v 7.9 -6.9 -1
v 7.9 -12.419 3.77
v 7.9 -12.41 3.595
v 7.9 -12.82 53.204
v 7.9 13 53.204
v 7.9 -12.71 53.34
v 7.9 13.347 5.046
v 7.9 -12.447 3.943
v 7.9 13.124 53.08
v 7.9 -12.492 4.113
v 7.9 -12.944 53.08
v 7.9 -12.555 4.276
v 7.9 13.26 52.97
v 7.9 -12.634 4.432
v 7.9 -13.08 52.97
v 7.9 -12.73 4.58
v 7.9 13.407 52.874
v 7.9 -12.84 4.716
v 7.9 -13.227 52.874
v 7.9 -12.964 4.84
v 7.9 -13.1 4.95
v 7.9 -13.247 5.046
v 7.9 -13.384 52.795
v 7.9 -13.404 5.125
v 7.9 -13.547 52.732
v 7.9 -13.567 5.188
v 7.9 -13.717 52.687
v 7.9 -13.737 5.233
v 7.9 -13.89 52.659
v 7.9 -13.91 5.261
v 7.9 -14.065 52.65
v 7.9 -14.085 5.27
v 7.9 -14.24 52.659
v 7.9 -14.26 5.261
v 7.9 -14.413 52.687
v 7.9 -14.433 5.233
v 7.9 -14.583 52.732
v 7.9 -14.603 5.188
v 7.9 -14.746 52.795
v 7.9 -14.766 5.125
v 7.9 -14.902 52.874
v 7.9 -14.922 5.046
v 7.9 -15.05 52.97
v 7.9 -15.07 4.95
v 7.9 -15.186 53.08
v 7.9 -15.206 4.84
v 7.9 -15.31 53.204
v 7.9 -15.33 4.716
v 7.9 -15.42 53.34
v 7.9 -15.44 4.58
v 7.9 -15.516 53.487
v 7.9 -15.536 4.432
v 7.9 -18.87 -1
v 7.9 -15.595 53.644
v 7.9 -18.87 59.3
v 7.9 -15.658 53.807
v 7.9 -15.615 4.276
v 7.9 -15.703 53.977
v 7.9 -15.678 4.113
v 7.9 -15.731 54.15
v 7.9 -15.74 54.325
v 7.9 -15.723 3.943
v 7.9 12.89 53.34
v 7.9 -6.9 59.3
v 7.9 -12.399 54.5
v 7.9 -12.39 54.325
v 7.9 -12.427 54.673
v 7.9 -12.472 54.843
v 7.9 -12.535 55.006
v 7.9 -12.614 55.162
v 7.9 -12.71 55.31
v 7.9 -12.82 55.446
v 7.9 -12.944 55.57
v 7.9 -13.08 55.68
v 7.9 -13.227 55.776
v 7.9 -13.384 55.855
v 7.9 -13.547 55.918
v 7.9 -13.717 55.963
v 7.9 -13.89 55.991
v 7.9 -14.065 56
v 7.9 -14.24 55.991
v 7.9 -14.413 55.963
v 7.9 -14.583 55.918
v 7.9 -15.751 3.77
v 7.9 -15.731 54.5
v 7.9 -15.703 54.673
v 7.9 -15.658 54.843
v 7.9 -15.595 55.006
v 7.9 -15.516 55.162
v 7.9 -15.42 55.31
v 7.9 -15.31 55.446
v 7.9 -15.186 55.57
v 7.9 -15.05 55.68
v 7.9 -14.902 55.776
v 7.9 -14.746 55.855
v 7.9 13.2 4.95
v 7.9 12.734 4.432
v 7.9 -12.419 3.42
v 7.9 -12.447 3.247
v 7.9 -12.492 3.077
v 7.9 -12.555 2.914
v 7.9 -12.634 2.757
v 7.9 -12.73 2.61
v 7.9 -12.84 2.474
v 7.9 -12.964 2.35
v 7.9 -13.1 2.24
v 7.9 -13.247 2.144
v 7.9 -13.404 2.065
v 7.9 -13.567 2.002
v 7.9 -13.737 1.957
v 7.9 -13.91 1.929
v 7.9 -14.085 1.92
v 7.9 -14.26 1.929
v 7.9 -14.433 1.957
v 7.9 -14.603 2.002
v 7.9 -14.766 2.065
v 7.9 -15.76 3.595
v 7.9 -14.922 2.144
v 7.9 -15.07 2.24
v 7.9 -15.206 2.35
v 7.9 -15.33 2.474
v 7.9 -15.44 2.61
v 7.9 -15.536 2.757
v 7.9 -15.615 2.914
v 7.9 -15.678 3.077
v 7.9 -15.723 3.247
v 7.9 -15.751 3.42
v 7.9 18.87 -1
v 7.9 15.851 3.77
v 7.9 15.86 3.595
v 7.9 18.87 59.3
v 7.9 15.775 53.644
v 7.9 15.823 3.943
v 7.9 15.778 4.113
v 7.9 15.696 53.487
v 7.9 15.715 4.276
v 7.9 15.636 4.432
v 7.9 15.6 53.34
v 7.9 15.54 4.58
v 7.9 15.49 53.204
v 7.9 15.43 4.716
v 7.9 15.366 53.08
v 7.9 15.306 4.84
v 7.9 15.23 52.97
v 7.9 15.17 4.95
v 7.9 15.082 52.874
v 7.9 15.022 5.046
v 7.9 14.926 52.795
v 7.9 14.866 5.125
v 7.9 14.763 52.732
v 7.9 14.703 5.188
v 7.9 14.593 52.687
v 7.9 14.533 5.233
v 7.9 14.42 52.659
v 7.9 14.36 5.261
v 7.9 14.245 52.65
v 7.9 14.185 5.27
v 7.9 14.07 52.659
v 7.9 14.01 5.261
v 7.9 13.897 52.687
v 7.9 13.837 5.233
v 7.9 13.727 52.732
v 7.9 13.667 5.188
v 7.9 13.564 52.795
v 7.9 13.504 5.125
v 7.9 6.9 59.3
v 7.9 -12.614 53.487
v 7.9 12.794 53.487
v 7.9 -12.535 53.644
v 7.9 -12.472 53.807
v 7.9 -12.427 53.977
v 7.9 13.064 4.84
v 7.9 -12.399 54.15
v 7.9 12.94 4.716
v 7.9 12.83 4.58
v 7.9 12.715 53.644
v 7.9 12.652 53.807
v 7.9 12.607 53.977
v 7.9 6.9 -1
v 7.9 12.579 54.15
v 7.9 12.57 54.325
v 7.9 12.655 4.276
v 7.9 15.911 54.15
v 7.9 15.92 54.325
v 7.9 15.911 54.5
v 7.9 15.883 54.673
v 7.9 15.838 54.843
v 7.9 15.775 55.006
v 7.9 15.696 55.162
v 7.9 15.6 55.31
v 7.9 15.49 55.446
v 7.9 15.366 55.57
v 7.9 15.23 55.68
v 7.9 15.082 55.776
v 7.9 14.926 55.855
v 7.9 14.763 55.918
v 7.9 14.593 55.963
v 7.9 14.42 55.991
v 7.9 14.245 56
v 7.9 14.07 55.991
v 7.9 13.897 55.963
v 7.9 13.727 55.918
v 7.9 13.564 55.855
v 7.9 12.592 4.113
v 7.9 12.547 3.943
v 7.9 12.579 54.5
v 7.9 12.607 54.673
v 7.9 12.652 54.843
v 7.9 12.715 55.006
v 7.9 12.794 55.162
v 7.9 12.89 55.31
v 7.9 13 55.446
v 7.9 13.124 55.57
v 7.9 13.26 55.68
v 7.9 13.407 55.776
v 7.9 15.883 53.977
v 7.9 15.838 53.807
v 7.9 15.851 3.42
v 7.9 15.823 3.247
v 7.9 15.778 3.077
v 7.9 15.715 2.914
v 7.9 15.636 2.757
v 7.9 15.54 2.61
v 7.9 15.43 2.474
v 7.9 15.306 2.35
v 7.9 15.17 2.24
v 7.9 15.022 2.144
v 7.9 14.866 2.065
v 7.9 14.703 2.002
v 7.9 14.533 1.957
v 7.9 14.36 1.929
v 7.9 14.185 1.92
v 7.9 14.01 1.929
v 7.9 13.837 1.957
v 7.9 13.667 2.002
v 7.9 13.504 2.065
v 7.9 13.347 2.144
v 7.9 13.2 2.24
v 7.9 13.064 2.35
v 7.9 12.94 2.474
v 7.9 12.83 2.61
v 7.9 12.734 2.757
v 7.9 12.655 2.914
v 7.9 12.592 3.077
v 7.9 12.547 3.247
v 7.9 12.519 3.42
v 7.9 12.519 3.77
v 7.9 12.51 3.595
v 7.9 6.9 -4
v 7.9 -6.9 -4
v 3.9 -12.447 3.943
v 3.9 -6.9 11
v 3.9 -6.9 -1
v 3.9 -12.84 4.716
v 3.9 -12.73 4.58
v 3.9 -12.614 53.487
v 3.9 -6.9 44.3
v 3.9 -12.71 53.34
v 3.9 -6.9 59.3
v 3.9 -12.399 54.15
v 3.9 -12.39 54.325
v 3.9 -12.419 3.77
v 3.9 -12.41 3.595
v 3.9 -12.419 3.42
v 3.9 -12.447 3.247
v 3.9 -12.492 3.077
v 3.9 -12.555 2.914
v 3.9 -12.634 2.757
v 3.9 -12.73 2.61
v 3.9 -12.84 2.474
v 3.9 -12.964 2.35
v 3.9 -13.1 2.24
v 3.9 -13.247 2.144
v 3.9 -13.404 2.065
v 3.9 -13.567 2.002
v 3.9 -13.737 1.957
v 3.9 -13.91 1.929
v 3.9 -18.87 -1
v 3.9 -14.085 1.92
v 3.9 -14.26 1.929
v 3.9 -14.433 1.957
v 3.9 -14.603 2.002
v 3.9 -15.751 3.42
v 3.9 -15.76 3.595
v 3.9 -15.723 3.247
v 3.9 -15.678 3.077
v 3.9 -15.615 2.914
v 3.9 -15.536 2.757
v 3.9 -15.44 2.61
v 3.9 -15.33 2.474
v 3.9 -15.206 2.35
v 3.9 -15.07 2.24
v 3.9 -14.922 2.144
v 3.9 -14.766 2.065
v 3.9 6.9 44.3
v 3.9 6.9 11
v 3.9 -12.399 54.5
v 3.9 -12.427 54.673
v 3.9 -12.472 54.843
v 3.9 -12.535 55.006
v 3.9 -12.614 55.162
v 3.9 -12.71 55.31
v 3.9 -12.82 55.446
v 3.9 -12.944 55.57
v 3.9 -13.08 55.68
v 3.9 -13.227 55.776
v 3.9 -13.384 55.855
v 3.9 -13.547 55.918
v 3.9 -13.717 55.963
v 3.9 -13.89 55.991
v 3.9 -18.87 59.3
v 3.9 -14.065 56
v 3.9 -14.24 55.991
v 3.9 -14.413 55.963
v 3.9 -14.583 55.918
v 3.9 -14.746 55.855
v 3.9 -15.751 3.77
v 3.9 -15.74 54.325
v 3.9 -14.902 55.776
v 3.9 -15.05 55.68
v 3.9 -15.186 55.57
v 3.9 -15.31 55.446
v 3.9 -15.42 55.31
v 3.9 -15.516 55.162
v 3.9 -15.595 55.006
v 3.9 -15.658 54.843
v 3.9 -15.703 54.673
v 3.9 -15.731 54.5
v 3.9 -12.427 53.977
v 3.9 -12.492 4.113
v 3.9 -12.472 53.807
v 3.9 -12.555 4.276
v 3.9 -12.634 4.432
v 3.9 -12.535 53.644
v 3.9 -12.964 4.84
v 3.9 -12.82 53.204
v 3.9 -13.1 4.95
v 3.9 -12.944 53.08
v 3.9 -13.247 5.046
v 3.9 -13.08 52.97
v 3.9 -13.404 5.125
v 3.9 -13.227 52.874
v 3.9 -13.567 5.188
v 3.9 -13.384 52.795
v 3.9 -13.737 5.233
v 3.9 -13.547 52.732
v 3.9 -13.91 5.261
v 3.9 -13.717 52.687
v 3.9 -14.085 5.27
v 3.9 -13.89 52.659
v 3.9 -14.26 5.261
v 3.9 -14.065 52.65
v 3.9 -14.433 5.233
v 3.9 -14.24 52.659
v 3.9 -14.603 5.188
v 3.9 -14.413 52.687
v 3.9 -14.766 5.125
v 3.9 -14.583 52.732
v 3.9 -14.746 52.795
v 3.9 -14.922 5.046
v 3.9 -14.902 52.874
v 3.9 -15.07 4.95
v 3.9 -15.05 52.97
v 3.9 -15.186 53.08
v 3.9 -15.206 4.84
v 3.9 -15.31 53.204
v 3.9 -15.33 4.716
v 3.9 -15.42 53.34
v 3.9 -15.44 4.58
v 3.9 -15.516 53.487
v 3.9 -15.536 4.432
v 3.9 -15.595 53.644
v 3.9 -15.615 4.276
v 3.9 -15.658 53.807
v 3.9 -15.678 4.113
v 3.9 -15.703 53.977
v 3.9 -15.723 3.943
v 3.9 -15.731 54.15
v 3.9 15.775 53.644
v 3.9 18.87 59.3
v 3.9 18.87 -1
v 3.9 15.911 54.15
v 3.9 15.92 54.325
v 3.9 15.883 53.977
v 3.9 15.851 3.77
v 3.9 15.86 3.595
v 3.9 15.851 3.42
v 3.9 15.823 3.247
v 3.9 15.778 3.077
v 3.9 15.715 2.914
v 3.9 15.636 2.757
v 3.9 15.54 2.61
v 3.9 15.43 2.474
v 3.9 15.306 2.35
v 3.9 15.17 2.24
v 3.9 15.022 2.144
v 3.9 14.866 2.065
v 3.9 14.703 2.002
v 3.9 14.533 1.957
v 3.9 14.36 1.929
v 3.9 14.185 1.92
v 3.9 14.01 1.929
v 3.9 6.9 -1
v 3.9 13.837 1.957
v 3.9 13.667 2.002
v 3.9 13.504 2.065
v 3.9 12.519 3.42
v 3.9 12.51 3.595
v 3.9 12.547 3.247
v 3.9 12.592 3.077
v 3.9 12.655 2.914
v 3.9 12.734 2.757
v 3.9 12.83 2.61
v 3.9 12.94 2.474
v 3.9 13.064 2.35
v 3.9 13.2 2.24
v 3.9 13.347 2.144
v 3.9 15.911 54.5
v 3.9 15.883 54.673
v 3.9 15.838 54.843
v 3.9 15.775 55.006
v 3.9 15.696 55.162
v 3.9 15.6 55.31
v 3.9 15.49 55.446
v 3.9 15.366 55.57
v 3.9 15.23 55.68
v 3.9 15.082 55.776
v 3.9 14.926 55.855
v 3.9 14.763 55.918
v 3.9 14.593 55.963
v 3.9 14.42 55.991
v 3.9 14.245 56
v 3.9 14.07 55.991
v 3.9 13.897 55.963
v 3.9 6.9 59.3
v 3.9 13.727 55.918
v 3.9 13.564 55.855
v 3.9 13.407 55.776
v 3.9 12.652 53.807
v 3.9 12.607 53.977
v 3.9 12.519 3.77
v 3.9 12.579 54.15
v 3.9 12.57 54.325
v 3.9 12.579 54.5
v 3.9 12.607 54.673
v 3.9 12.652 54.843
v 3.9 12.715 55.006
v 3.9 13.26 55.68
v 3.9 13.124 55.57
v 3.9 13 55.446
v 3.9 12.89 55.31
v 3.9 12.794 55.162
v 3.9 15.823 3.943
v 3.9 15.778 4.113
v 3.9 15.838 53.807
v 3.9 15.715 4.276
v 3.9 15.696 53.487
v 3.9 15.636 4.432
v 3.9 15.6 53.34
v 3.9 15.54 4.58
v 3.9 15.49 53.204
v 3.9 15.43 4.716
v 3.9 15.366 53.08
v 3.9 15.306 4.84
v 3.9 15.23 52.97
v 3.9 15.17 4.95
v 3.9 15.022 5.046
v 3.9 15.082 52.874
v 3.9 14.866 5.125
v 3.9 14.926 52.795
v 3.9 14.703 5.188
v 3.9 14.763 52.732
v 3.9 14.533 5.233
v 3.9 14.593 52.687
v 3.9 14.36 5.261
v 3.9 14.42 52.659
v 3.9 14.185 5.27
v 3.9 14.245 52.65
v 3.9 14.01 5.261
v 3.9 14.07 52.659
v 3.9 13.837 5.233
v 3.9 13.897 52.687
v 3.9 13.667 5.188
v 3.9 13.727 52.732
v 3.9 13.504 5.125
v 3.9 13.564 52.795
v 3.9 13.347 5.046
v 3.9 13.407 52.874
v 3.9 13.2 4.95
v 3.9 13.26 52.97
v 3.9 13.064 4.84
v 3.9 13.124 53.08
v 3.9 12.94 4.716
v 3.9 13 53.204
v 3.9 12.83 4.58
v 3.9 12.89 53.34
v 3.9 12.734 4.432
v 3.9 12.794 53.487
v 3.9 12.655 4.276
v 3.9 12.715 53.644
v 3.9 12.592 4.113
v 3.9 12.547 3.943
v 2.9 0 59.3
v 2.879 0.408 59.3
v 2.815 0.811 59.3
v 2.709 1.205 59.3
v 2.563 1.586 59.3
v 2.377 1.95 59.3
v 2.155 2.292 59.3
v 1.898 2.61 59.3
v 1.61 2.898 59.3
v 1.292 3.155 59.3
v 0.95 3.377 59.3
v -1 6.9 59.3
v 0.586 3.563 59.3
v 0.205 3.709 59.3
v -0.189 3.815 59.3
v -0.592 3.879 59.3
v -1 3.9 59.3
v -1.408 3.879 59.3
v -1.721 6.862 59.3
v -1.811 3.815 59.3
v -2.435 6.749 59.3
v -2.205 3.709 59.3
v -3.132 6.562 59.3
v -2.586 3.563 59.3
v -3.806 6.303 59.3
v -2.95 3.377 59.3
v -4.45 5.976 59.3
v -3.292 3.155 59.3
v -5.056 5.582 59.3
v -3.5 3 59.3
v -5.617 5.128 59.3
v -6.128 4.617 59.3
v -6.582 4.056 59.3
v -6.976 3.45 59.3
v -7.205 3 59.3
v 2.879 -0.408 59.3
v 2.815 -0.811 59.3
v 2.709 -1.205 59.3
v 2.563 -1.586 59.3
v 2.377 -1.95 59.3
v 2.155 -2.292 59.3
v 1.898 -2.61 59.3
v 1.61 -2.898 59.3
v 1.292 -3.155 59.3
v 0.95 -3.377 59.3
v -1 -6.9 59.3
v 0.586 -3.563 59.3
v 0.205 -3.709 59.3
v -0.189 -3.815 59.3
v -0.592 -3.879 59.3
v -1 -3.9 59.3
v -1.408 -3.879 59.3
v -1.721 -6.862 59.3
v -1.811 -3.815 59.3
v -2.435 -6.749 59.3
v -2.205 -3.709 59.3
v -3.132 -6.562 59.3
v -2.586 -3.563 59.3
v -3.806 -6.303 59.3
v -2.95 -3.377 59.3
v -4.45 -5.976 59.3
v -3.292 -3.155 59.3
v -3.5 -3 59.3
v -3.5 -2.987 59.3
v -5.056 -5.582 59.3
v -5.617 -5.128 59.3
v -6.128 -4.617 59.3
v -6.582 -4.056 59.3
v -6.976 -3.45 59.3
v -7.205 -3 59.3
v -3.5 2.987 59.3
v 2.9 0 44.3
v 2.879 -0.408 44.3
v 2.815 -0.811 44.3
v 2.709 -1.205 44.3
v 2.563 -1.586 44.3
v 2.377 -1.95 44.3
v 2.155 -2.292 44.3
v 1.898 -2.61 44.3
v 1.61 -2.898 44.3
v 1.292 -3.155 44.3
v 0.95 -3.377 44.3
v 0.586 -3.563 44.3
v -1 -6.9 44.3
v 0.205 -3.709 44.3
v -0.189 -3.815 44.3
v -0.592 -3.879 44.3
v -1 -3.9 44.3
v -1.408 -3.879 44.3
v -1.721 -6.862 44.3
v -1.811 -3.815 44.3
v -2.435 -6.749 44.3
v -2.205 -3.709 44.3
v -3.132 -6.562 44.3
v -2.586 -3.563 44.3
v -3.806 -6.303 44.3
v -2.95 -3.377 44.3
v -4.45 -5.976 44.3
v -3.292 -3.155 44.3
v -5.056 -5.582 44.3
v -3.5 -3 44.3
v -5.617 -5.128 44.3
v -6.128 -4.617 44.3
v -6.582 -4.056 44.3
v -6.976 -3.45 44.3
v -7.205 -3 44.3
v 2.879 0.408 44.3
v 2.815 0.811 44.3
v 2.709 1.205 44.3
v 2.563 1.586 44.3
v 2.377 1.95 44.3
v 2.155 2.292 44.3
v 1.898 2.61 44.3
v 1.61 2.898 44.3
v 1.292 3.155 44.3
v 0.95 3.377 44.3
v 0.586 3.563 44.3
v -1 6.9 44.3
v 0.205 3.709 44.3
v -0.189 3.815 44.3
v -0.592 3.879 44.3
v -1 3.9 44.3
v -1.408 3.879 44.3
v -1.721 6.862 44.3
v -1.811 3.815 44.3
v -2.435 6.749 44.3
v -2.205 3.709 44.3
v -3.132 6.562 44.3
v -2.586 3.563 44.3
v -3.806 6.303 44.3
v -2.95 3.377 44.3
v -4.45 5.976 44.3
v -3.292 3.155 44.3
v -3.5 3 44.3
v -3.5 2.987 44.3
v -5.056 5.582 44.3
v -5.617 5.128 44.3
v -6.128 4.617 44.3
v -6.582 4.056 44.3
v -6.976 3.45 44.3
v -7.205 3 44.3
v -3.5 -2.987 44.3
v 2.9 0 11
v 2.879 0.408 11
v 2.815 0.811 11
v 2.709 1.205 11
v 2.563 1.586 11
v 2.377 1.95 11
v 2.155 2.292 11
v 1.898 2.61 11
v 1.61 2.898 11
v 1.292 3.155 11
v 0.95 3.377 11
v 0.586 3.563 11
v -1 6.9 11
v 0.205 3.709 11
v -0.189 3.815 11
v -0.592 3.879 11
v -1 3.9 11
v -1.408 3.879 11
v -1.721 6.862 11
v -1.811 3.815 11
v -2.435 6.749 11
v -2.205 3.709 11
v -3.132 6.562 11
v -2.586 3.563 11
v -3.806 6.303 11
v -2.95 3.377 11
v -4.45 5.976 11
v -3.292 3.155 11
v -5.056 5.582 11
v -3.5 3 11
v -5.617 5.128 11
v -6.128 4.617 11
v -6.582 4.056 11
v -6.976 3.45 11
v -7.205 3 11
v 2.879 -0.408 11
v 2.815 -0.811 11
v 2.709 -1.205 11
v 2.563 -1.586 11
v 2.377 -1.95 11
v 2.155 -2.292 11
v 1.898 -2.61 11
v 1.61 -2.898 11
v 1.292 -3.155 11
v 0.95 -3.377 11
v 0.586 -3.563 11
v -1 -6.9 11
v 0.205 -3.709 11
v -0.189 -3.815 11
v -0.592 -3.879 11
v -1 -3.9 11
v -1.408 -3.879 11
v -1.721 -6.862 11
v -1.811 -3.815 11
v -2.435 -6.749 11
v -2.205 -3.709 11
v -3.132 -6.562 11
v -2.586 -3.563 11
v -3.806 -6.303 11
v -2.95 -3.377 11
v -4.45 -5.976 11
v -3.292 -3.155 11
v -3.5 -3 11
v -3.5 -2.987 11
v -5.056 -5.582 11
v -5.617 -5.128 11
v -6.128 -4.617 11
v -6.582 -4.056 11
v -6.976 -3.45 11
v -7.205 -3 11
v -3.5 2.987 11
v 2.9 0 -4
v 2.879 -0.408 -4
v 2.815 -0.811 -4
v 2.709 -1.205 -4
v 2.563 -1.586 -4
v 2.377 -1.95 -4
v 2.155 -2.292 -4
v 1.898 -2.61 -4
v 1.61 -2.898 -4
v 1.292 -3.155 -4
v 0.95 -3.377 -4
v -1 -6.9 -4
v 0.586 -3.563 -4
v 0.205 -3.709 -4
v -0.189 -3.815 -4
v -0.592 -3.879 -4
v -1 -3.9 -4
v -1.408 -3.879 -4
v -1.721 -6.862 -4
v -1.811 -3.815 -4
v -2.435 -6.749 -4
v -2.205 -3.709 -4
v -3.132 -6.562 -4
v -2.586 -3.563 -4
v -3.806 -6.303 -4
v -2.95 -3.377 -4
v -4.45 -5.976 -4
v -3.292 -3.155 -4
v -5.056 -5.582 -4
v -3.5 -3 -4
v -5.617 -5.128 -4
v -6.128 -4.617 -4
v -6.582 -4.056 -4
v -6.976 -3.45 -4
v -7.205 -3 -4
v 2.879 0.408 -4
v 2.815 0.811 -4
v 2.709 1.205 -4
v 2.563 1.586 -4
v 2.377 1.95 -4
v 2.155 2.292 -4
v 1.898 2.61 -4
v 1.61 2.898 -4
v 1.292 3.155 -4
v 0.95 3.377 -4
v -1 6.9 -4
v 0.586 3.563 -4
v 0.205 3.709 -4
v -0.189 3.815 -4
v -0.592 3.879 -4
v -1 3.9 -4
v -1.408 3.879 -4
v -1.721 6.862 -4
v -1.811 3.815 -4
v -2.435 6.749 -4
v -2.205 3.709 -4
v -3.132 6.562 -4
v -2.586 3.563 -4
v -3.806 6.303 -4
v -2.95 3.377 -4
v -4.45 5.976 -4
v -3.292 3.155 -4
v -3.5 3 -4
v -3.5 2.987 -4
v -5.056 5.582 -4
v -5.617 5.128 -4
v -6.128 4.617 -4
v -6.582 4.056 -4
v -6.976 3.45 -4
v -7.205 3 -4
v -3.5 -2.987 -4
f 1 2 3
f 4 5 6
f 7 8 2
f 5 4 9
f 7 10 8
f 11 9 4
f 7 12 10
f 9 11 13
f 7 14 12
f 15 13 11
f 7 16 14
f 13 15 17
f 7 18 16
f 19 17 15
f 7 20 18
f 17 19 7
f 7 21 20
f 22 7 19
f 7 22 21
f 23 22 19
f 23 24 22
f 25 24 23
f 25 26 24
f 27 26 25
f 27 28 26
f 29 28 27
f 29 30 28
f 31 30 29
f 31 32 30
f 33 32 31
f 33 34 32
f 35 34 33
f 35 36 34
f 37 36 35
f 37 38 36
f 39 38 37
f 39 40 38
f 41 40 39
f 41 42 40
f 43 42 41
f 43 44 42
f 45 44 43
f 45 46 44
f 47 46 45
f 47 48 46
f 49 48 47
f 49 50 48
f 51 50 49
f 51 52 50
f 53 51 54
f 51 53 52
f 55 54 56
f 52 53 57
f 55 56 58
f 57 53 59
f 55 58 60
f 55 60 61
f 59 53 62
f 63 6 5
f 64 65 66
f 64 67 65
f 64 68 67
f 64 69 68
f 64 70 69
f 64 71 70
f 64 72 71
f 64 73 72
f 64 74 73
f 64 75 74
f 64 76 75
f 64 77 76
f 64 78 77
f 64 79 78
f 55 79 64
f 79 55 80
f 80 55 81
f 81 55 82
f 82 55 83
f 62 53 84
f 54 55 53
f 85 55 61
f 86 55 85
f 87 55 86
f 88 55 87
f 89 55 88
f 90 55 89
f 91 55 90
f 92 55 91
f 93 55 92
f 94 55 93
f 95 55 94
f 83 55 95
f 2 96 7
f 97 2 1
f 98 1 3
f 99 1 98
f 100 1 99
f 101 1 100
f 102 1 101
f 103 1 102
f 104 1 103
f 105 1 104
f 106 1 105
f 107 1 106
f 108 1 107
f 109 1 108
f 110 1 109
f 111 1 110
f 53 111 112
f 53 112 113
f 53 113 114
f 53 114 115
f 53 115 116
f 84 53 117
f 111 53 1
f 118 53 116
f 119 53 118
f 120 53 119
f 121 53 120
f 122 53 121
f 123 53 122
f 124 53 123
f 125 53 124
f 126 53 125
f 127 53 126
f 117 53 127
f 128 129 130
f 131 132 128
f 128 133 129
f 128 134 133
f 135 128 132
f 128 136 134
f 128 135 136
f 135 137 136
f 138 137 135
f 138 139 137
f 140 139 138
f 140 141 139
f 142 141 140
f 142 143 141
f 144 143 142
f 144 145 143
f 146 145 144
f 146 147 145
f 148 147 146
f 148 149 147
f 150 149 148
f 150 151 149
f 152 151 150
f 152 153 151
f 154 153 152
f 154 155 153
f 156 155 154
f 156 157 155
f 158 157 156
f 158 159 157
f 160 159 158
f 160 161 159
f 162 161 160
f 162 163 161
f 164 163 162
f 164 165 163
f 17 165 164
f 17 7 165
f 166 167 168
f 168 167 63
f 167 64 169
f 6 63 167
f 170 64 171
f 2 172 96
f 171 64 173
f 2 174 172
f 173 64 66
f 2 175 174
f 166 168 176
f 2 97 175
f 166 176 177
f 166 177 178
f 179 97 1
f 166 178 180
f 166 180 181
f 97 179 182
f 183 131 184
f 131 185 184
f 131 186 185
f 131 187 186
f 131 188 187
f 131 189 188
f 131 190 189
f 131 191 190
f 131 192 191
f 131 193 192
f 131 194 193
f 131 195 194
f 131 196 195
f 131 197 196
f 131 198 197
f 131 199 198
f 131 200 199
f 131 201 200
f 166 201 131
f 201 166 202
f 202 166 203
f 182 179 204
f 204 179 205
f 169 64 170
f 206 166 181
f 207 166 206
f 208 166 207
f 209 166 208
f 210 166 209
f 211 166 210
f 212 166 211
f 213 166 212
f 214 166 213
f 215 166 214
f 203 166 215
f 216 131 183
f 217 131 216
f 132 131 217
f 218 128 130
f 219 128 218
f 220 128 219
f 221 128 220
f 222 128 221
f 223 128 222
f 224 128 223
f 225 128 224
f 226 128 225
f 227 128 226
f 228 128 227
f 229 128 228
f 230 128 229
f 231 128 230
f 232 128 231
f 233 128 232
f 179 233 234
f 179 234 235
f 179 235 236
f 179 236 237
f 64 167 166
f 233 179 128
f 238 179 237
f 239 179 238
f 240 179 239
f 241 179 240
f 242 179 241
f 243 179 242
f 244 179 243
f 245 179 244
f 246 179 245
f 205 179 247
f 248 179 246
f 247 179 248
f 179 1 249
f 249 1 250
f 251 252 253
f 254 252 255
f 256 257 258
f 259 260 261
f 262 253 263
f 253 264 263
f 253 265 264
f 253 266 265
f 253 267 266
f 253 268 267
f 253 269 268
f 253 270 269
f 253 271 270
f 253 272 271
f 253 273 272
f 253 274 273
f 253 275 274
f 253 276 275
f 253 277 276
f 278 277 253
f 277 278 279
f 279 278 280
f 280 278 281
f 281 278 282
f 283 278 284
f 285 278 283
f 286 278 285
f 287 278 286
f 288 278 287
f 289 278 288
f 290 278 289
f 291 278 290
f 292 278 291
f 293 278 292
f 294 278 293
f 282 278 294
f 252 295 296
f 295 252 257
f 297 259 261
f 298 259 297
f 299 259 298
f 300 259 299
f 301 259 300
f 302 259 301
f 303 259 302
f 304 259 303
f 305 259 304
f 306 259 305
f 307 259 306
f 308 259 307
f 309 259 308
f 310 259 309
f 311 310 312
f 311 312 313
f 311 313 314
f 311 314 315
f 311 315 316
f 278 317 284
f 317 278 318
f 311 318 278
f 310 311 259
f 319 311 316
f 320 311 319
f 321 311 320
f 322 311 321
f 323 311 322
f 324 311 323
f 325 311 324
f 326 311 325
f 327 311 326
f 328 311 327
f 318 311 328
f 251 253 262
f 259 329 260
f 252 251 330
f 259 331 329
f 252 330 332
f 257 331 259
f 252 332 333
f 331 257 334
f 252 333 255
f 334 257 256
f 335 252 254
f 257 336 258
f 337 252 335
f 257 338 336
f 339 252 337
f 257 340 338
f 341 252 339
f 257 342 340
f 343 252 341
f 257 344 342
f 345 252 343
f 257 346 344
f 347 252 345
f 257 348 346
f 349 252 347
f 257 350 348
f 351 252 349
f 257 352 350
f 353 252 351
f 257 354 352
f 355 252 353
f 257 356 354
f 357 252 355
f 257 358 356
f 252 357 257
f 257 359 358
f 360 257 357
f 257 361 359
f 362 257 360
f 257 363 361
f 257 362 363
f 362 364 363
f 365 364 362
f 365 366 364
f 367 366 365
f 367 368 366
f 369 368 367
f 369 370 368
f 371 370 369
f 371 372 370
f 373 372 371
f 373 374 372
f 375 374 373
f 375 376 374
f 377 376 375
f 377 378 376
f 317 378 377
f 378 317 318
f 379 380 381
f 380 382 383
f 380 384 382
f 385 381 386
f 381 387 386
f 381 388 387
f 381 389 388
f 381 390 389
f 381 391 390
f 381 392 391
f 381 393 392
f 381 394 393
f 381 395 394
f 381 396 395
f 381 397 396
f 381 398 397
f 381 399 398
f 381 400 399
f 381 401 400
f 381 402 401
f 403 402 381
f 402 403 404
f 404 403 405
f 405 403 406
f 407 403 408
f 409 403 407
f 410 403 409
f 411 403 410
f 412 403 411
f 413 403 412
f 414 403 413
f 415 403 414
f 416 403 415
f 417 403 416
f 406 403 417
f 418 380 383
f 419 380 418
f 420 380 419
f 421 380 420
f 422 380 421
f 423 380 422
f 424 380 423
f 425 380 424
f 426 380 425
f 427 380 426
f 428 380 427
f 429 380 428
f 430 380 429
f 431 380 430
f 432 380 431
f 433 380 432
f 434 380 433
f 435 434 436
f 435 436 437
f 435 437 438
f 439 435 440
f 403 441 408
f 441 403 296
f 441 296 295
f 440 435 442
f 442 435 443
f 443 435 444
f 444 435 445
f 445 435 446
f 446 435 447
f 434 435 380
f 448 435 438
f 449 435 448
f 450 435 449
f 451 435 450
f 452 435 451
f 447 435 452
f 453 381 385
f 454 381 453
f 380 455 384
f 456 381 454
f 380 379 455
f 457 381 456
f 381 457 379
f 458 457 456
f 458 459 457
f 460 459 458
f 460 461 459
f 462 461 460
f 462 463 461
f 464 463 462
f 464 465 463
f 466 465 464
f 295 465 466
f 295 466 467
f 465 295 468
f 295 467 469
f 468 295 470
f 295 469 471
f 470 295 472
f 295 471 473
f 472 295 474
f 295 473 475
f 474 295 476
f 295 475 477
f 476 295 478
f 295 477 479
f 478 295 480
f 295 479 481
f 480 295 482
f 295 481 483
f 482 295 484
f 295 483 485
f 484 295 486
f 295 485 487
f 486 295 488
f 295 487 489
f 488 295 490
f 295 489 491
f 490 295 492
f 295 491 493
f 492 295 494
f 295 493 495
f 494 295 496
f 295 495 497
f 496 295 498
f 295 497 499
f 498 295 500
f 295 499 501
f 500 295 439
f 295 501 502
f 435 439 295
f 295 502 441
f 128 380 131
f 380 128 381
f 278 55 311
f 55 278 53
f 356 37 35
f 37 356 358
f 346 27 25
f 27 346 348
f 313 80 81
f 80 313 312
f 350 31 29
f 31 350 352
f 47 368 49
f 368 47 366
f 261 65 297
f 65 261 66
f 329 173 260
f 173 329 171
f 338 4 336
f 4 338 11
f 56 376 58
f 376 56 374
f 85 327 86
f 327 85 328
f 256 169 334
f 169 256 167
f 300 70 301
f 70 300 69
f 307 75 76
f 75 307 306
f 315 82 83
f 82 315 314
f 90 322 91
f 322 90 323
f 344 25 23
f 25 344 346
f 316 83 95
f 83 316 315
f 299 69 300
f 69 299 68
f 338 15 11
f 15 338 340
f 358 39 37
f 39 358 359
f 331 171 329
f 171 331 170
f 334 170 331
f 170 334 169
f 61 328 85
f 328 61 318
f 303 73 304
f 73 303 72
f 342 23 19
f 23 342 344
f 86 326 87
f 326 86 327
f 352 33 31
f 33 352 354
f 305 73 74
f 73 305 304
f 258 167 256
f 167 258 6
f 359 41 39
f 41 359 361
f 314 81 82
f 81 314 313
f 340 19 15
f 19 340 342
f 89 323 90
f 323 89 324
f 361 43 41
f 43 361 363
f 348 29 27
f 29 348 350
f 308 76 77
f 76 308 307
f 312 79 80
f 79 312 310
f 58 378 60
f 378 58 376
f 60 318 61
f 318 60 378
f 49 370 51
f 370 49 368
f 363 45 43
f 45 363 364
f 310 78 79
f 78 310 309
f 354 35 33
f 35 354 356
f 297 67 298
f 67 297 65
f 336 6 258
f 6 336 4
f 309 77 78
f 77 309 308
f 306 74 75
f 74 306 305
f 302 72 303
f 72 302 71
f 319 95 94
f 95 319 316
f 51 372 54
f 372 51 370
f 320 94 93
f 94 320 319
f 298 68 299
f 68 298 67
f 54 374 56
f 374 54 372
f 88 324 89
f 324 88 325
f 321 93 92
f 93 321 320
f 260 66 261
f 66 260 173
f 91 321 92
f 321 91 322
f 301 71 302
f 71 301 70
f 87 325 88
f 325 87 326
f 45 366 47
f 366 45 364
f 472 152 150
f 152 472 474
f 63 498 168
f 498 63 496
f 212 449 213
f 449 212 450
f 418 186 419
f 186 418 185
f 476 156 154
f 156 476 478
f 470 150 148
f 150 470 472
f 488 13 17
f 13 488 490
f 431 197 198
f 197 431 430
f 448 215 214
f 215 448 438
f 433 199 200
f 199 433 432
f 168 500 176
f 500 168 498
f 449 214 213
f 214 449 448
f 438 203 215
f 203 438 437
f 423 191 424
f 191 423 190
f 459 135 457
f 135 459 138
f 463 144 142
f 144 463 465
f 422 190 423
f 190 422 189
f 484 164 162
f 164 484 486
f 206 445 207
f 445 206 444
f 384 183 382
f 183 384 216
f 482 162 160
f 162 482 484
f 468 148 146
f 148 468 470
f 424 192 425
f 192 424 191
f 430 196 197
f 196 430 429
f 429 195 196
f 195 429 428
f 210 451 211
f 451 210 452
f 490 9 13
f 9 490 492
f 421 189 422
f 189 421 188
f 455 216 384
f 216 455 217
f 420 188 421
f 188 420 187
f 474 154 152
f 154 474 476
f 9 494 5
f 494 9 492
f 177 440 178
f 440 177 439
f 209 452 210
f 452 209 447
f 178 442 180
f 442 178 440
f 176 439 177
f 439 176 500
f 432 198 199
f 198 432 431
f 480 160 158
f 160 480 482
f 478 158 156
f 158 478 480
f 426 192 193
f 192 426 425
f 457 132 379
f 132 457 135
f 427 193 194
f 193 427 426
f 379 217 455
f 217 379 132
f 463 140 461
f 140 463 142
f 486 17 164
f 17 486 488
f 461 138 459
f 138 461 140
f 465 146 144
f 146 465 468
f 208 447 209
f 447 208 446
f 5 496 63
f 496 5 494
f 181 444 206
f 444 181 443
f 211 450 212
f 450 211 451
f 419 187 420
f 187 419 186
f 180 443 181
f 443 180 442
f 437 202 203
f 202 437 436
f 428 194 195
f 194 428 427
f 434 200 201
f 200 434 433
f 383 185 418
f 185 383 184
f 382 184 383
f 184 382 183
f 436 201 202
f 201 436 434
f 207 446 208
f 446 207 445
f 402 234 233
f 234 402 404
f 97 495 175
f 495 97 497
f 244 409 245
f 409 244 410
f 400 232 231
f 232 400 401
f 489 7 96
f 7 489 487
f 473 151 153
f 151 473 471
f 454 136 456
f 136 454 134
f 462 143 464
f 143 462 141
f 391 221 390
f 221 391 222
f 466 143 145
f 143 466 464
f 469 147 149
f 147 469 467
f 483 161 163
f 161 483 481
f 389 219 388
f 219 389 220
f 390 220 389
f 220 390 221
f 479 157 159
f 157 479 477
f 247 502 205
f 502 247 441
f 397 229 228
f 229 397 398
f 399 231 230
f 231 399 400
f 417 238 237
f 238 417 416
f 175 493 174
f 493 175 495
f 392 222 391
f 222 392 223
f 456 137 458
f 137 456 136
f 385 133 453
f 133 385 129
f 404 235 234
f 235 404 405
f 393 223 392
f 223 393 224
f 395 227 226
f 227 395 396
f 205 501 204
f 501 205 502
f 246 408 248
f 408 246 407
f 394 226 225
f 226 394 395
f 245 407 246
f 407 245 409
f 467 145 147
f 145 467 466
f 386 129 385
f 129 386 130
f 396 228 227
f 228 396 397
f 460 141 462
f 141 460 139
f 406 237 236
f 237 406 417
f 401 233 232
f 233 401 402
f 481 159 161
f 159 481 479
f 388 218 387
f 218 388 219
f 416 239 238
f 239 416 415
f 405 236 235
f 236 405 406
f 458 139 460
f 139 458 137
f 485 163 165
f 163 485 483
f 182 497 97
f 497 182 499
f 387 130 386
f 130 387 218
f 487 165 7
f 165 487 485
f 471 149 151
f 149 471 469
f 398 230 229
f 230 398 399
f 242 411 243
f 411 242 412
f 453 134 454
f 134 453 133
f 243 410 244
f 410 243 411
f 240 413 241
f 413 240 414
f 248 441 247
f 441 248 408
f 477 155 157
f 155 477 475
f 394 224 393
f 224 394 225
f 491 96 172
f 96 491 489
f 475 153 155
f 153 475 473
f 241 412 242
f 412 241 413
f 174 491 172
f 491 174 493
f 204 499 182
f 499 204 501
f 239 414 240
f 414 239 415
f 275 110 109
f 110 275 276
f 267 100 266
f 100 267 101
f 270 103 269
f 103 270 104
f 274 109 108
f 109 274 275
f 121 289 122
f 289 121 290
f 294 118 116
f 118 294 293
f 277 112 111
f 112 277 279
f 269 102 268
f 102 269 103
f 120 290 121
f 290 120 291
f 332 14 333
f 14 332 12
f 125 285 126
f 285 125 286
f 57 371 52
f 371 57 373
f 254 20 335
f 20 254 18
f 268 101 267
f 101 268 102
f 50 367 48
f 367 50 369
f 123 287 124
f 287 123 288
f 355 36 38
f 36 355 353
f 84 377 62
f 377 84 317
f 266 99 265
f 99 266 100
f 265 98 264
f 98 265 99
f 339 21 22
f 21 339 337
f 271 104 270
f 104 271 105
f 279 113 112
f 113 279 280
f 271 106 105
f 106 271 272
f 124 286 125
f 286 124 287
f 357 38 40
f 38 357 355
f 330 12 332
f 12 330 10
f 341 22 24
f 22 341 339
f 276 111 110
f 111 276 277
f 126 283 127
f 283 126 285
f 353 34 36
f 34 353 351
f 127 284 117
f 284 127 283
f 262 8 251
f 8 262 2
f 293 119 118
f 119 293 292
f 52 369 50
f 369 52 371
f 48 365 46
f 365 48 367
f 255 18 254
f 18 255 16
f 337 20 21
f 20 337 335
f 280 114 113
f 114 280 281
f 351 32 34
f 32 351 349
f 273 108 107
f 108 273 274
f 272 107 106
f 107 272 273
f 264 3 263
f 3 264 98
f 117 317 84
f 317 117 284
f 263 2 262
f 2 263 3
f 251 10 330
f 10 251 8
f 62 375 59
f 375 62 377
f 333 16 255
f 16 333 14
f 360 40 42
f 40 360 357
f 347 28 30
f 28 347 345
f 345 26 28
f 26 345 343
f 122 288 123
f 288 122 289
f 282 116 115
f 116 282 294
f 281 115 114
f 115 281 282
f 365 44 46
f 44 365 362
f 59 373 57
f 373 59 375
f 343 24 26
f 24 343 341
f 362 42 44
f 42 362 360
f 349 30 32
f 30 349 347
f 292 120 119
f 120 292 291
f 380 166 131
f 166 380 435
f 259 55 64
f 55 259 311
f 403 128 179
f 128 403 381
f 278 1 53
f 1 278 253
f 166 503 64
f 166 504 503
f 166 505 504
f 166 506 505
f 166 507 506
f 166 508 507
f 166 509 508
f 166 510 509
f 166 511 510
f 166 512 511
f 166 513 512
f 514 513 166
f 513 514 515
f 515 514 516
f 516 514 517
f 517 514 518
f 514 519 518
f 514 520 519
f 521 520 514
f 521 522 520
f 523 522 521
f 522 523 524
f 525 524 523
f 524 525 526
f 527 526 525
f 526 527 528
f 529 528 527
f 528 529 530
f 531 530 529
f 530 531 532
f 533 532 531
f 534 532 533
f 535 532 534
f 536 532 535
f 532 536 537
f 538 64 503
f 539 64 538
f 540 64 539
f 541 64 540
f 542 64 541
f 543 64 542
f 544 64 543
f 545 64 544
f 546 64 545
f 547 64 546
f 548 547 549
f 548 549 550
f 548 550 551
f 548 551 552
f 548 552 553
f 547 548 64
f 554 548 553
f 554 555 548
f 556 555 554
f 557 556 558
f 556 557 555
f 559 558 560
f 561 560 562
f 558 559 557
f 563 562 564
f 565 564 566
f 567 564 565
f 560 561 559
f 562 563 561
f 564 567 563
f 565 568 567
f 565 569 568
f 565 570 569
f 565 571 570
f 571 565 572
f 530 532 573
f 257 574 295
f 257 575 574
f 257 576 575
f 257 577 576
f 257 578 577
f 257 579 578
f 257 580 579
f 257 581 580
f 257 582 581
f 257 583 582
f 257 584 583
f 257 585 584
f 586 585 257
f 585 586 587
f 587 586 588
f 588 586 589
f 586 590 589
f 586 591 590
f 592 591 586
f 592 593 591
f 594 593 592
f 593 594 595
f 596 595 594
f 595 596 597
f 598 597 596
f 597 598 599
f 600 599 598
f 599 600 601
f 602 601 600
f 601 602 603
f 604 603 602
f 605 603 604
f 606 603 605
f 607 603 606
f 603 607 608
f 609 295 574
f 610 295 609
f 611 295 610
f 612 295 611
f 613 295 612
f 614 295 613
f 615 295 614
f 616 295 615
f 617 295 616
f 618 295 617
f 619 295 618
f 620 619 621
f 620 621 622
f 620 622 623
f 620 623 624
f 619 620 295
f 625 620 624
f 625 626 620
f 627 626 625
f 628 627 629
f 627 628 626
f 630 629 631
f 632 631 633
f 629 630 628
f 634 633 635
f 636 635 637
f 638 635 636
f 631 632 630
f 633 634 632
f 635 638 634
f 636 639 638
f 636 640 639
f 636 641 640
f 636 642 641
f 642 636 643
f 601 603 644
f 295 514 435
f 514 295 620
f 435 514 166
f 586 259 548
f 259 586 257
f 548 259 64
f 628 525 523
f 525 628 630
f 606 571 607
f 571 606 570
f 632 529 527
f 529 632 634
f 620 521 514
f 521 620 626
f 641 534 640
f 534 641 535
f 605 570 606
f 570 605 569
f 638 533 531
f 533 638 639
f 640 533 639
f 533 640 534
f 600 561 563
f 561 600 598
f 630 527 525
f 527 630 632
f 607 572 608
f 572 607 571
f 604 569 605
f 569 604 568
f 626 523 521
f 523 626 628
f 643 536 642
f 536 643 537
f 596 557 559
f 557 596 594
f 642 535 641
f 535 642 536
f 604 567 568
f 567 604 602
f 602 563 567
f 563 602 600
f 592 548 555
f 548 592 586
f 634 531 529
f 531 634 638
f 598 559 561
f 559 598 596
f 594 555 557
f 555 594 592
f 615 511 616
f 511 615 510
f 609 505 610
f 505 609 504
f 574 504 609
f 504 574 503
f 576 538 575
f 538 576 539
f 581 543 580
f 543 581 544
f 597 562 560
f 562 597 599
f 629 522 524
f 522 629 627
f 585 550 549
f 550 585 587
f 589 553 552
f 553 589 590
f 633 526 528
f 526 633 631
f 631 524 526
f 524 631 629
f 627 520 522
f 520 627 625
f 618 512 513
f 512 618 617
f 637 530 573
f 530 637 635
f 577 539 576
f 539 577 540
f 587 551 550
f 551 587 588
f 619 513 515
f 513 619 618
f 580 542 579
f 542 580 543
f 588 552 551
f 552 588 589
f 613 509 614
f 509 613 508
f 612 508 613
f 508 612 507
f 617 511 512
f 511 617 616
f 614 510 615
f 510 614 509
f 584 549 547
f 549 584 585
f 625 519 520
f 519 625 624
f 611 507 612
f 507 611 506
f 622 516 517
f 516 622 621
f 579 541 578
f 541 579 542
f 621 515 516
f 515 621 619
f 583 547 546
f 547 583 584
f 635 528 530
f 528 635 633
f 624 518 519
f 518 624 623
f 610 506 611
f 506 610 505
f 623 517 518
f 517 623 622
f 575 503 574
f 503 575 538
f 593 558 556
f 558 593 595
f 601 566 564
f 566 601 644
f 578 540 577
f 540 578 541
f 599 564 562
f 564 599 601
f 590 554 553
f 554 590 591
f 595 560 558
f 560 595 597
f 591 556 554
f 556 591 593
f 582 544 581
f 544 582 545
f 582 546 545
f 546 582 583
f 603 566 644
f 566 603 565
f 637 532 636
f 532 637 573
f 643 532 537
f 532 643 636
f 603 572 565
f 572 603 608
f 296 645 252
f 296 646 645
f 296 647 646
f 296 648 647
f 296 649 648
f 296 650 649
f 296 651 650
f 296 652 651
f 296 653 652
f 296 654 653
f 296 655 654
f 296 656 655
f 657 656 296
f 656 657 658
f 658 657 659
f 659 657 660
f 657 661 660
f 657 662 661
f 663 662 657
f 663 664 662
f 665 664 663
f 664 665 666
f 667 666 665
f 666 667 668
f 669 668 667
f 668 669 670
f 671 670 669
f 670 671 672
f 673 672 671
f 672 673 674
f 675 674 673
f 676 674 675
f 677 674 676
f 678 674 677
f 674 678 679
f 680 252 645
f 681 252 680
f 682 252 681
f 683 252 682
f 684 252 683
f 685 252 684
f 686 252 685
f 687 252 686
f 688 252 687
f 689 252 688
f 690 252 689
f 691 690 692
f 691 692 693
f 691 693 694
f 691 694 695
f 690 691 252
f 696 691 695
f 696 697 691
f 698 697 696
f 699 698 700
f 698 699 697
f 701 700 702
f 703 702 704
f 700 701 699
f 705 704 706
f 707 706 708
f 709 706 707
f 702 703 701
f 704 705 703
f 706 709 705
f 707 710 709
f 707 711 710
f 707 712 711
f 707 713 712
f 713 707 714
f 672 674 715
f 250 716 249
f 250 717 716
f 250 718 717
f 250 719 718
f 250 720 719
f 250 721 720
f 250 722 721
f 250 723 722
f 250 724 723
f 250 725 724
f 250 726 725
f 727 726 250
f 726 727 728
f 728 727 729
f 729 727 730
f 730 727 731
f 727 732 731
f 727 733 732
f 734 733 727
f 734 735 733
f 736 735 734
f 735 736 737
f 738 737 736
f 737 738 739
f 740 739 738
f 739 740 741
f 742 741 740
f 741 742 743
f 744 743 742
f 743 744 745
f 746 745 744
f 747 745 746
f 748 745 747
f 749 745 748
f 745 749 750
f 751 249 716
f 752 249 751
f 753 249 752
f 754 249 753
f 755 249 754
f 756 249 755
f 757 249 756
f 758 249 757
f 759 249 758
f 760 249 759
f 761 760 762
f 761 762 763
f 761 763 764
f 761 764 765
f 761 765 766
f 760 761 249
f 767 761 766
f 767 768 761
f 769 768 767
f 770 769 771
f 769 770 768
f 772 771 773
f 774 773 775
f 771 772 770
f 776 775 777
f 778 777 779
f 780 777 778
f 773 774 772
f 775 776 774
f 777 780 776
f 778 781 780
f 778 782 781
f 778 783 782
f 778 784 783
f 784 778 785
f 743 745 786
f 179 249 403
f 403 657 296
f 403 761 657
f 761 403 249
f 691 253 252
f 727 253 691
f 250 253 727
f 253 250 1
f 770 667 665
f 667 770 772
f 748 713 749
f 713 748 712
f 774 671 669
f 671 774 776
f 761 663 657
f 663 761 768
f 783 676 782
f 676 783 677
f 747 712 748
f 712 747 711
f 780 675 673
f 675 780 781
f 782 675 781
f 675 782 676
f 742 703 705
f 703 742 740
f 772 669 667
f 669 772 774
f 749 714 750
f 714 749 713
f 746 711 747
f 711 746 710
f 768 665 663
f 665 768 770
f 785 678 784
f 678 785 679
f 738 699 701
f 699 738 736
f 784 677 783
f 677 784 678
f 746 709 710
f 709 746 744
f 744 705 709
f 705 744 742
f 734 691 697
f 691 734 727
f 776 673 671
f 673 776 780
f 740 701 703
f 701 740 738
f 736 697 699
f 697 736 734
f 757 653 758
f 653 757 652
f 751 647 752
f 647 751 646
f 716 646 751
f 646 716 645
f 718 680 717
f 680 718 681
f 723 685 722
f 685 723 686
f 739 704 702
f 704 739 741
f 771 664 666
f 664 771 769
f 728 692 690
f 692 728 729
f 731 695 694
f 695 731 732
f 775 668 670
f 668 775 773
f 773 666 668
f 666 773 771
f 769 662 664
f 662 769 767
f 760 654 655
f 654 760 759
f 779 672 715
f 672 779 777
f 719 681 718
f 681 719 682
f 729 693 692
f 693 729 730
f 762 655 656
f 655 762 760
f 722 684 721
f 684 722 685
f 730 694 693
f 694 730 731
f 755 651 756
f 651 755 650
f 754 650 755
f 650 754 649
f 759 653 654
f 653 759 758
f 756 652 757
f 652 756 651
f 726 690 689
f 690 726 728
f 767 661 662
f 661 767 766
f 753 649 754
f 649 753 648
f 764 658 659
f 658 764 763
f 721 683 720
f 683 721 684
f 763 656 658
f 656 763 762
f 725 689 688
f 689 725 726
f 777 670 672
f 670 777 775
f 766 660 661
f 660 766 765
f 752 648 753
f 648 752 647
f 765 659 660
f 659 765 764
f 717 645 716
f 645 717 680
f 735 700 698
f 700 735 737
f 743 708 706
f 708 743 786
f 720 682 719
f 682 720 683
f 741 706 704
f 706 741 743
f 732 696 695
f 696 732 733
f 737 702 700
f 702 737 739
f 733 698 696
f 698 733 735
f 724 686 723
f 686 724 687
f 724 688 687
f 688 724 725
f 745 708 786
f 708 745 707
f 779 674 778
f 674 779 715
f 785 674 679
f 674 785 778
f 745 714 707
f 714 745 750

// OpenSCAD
// file: inc/common.scad
m8_r = 3.9;
m8_nut_outer_d = 14.5;
m8_nut_h = 6.34;

module m8_rod(l) {
    rotate([-90, 0, 0])
        cylinder(r=m8_r, h=l);
}

bearing_608zz_h = 6.94;
bearing_608zz_d = 22;
bearing_608zz_r = bearing_608zz_d/2;

frame_thickness = 3.14;
m3_r = 1.475;
module m3_hole(l) {
    cylinder(r=m3_r, h=l);
}

module horizontal_m3_hole() {
    translate([0, 60, 0])
        rotate([90, 0, 0])
            m3_hole(70);
}
// main file
$fn = 60;
include <inc/common.scad>


relay_h = 58.3;
relay_w = 35.74;

module m8_wrap(h) {
    wrap_thickness = 3;
    wrap_r = m8_r + wrap_thickness;
    difference() {
        union() {
            translate([0, -wrap_r, 0])
                cube([wrap_r+2, 2*wrap_r, h]);
            cylinder(r=wrap_r, h=h);
        }
        translate([0,0,-0.1]) cylinder(r=m8_r, h=h+0.2);
        translate([-5, 0, h/2])
            cube([5, 6, h+0.2], center=true);
    }
}

plate_hole_r = m3_r+0.2;
module plate_hole(h) {
    cylinder(r=plate_hole_r, h=h);
}

module plate() {
    union() {
    difference() {
        translate([m8_r+2, 0, relay_h/2]) cube([4, relay_w+2, relay_h], center=true);
        translate([0, -relay_w/2+(2.13+plate_hole_r), relay_h-(2.3+plate_hole_r)]) rotate([0, 90, 0]) plate_hole(10);
        translate([0, relay_w/2-(1.95+plate_hole_r), relay_h-(2.3+plate_hole_r)]) rotate([0, 90, 0]) plate_hole(10);
        translate([0, relay_w/2-(2.01+plate_hole_r), 1.92+plate_hole_r]) rotate([0, 90, 0]) plate_hole(10);
        translate([0, -relay_w/2+(2.11+plate_hole_r), 1.92+plate_hole_r]) rotate([0, 90, 0]) plate_hole(10);
    }
    // for top enforcement
    translate([m8_r/2+1.95, -relay_w/2-1, relay_h]) cube([4, relay_w+2, 1]);
    // for bottom enforcement
    translate([m8_r/2+1.95, -relay_w/2-1, -1]) cube([4, relay_w+2, 1]);
    }
}

wrap_h = 15;
//rotate([0, 90, 0])
union() {
    plate();
    translate([-1, 0, relay_h-wrap_h+1])
        m8_wrap(wrap_h);
    translate([-1, 0, -4]) m8_wrap(wrap_h);
}
%translate([0, 0, -25]) rotate([90, 0, 0]) m8_rod(100);
